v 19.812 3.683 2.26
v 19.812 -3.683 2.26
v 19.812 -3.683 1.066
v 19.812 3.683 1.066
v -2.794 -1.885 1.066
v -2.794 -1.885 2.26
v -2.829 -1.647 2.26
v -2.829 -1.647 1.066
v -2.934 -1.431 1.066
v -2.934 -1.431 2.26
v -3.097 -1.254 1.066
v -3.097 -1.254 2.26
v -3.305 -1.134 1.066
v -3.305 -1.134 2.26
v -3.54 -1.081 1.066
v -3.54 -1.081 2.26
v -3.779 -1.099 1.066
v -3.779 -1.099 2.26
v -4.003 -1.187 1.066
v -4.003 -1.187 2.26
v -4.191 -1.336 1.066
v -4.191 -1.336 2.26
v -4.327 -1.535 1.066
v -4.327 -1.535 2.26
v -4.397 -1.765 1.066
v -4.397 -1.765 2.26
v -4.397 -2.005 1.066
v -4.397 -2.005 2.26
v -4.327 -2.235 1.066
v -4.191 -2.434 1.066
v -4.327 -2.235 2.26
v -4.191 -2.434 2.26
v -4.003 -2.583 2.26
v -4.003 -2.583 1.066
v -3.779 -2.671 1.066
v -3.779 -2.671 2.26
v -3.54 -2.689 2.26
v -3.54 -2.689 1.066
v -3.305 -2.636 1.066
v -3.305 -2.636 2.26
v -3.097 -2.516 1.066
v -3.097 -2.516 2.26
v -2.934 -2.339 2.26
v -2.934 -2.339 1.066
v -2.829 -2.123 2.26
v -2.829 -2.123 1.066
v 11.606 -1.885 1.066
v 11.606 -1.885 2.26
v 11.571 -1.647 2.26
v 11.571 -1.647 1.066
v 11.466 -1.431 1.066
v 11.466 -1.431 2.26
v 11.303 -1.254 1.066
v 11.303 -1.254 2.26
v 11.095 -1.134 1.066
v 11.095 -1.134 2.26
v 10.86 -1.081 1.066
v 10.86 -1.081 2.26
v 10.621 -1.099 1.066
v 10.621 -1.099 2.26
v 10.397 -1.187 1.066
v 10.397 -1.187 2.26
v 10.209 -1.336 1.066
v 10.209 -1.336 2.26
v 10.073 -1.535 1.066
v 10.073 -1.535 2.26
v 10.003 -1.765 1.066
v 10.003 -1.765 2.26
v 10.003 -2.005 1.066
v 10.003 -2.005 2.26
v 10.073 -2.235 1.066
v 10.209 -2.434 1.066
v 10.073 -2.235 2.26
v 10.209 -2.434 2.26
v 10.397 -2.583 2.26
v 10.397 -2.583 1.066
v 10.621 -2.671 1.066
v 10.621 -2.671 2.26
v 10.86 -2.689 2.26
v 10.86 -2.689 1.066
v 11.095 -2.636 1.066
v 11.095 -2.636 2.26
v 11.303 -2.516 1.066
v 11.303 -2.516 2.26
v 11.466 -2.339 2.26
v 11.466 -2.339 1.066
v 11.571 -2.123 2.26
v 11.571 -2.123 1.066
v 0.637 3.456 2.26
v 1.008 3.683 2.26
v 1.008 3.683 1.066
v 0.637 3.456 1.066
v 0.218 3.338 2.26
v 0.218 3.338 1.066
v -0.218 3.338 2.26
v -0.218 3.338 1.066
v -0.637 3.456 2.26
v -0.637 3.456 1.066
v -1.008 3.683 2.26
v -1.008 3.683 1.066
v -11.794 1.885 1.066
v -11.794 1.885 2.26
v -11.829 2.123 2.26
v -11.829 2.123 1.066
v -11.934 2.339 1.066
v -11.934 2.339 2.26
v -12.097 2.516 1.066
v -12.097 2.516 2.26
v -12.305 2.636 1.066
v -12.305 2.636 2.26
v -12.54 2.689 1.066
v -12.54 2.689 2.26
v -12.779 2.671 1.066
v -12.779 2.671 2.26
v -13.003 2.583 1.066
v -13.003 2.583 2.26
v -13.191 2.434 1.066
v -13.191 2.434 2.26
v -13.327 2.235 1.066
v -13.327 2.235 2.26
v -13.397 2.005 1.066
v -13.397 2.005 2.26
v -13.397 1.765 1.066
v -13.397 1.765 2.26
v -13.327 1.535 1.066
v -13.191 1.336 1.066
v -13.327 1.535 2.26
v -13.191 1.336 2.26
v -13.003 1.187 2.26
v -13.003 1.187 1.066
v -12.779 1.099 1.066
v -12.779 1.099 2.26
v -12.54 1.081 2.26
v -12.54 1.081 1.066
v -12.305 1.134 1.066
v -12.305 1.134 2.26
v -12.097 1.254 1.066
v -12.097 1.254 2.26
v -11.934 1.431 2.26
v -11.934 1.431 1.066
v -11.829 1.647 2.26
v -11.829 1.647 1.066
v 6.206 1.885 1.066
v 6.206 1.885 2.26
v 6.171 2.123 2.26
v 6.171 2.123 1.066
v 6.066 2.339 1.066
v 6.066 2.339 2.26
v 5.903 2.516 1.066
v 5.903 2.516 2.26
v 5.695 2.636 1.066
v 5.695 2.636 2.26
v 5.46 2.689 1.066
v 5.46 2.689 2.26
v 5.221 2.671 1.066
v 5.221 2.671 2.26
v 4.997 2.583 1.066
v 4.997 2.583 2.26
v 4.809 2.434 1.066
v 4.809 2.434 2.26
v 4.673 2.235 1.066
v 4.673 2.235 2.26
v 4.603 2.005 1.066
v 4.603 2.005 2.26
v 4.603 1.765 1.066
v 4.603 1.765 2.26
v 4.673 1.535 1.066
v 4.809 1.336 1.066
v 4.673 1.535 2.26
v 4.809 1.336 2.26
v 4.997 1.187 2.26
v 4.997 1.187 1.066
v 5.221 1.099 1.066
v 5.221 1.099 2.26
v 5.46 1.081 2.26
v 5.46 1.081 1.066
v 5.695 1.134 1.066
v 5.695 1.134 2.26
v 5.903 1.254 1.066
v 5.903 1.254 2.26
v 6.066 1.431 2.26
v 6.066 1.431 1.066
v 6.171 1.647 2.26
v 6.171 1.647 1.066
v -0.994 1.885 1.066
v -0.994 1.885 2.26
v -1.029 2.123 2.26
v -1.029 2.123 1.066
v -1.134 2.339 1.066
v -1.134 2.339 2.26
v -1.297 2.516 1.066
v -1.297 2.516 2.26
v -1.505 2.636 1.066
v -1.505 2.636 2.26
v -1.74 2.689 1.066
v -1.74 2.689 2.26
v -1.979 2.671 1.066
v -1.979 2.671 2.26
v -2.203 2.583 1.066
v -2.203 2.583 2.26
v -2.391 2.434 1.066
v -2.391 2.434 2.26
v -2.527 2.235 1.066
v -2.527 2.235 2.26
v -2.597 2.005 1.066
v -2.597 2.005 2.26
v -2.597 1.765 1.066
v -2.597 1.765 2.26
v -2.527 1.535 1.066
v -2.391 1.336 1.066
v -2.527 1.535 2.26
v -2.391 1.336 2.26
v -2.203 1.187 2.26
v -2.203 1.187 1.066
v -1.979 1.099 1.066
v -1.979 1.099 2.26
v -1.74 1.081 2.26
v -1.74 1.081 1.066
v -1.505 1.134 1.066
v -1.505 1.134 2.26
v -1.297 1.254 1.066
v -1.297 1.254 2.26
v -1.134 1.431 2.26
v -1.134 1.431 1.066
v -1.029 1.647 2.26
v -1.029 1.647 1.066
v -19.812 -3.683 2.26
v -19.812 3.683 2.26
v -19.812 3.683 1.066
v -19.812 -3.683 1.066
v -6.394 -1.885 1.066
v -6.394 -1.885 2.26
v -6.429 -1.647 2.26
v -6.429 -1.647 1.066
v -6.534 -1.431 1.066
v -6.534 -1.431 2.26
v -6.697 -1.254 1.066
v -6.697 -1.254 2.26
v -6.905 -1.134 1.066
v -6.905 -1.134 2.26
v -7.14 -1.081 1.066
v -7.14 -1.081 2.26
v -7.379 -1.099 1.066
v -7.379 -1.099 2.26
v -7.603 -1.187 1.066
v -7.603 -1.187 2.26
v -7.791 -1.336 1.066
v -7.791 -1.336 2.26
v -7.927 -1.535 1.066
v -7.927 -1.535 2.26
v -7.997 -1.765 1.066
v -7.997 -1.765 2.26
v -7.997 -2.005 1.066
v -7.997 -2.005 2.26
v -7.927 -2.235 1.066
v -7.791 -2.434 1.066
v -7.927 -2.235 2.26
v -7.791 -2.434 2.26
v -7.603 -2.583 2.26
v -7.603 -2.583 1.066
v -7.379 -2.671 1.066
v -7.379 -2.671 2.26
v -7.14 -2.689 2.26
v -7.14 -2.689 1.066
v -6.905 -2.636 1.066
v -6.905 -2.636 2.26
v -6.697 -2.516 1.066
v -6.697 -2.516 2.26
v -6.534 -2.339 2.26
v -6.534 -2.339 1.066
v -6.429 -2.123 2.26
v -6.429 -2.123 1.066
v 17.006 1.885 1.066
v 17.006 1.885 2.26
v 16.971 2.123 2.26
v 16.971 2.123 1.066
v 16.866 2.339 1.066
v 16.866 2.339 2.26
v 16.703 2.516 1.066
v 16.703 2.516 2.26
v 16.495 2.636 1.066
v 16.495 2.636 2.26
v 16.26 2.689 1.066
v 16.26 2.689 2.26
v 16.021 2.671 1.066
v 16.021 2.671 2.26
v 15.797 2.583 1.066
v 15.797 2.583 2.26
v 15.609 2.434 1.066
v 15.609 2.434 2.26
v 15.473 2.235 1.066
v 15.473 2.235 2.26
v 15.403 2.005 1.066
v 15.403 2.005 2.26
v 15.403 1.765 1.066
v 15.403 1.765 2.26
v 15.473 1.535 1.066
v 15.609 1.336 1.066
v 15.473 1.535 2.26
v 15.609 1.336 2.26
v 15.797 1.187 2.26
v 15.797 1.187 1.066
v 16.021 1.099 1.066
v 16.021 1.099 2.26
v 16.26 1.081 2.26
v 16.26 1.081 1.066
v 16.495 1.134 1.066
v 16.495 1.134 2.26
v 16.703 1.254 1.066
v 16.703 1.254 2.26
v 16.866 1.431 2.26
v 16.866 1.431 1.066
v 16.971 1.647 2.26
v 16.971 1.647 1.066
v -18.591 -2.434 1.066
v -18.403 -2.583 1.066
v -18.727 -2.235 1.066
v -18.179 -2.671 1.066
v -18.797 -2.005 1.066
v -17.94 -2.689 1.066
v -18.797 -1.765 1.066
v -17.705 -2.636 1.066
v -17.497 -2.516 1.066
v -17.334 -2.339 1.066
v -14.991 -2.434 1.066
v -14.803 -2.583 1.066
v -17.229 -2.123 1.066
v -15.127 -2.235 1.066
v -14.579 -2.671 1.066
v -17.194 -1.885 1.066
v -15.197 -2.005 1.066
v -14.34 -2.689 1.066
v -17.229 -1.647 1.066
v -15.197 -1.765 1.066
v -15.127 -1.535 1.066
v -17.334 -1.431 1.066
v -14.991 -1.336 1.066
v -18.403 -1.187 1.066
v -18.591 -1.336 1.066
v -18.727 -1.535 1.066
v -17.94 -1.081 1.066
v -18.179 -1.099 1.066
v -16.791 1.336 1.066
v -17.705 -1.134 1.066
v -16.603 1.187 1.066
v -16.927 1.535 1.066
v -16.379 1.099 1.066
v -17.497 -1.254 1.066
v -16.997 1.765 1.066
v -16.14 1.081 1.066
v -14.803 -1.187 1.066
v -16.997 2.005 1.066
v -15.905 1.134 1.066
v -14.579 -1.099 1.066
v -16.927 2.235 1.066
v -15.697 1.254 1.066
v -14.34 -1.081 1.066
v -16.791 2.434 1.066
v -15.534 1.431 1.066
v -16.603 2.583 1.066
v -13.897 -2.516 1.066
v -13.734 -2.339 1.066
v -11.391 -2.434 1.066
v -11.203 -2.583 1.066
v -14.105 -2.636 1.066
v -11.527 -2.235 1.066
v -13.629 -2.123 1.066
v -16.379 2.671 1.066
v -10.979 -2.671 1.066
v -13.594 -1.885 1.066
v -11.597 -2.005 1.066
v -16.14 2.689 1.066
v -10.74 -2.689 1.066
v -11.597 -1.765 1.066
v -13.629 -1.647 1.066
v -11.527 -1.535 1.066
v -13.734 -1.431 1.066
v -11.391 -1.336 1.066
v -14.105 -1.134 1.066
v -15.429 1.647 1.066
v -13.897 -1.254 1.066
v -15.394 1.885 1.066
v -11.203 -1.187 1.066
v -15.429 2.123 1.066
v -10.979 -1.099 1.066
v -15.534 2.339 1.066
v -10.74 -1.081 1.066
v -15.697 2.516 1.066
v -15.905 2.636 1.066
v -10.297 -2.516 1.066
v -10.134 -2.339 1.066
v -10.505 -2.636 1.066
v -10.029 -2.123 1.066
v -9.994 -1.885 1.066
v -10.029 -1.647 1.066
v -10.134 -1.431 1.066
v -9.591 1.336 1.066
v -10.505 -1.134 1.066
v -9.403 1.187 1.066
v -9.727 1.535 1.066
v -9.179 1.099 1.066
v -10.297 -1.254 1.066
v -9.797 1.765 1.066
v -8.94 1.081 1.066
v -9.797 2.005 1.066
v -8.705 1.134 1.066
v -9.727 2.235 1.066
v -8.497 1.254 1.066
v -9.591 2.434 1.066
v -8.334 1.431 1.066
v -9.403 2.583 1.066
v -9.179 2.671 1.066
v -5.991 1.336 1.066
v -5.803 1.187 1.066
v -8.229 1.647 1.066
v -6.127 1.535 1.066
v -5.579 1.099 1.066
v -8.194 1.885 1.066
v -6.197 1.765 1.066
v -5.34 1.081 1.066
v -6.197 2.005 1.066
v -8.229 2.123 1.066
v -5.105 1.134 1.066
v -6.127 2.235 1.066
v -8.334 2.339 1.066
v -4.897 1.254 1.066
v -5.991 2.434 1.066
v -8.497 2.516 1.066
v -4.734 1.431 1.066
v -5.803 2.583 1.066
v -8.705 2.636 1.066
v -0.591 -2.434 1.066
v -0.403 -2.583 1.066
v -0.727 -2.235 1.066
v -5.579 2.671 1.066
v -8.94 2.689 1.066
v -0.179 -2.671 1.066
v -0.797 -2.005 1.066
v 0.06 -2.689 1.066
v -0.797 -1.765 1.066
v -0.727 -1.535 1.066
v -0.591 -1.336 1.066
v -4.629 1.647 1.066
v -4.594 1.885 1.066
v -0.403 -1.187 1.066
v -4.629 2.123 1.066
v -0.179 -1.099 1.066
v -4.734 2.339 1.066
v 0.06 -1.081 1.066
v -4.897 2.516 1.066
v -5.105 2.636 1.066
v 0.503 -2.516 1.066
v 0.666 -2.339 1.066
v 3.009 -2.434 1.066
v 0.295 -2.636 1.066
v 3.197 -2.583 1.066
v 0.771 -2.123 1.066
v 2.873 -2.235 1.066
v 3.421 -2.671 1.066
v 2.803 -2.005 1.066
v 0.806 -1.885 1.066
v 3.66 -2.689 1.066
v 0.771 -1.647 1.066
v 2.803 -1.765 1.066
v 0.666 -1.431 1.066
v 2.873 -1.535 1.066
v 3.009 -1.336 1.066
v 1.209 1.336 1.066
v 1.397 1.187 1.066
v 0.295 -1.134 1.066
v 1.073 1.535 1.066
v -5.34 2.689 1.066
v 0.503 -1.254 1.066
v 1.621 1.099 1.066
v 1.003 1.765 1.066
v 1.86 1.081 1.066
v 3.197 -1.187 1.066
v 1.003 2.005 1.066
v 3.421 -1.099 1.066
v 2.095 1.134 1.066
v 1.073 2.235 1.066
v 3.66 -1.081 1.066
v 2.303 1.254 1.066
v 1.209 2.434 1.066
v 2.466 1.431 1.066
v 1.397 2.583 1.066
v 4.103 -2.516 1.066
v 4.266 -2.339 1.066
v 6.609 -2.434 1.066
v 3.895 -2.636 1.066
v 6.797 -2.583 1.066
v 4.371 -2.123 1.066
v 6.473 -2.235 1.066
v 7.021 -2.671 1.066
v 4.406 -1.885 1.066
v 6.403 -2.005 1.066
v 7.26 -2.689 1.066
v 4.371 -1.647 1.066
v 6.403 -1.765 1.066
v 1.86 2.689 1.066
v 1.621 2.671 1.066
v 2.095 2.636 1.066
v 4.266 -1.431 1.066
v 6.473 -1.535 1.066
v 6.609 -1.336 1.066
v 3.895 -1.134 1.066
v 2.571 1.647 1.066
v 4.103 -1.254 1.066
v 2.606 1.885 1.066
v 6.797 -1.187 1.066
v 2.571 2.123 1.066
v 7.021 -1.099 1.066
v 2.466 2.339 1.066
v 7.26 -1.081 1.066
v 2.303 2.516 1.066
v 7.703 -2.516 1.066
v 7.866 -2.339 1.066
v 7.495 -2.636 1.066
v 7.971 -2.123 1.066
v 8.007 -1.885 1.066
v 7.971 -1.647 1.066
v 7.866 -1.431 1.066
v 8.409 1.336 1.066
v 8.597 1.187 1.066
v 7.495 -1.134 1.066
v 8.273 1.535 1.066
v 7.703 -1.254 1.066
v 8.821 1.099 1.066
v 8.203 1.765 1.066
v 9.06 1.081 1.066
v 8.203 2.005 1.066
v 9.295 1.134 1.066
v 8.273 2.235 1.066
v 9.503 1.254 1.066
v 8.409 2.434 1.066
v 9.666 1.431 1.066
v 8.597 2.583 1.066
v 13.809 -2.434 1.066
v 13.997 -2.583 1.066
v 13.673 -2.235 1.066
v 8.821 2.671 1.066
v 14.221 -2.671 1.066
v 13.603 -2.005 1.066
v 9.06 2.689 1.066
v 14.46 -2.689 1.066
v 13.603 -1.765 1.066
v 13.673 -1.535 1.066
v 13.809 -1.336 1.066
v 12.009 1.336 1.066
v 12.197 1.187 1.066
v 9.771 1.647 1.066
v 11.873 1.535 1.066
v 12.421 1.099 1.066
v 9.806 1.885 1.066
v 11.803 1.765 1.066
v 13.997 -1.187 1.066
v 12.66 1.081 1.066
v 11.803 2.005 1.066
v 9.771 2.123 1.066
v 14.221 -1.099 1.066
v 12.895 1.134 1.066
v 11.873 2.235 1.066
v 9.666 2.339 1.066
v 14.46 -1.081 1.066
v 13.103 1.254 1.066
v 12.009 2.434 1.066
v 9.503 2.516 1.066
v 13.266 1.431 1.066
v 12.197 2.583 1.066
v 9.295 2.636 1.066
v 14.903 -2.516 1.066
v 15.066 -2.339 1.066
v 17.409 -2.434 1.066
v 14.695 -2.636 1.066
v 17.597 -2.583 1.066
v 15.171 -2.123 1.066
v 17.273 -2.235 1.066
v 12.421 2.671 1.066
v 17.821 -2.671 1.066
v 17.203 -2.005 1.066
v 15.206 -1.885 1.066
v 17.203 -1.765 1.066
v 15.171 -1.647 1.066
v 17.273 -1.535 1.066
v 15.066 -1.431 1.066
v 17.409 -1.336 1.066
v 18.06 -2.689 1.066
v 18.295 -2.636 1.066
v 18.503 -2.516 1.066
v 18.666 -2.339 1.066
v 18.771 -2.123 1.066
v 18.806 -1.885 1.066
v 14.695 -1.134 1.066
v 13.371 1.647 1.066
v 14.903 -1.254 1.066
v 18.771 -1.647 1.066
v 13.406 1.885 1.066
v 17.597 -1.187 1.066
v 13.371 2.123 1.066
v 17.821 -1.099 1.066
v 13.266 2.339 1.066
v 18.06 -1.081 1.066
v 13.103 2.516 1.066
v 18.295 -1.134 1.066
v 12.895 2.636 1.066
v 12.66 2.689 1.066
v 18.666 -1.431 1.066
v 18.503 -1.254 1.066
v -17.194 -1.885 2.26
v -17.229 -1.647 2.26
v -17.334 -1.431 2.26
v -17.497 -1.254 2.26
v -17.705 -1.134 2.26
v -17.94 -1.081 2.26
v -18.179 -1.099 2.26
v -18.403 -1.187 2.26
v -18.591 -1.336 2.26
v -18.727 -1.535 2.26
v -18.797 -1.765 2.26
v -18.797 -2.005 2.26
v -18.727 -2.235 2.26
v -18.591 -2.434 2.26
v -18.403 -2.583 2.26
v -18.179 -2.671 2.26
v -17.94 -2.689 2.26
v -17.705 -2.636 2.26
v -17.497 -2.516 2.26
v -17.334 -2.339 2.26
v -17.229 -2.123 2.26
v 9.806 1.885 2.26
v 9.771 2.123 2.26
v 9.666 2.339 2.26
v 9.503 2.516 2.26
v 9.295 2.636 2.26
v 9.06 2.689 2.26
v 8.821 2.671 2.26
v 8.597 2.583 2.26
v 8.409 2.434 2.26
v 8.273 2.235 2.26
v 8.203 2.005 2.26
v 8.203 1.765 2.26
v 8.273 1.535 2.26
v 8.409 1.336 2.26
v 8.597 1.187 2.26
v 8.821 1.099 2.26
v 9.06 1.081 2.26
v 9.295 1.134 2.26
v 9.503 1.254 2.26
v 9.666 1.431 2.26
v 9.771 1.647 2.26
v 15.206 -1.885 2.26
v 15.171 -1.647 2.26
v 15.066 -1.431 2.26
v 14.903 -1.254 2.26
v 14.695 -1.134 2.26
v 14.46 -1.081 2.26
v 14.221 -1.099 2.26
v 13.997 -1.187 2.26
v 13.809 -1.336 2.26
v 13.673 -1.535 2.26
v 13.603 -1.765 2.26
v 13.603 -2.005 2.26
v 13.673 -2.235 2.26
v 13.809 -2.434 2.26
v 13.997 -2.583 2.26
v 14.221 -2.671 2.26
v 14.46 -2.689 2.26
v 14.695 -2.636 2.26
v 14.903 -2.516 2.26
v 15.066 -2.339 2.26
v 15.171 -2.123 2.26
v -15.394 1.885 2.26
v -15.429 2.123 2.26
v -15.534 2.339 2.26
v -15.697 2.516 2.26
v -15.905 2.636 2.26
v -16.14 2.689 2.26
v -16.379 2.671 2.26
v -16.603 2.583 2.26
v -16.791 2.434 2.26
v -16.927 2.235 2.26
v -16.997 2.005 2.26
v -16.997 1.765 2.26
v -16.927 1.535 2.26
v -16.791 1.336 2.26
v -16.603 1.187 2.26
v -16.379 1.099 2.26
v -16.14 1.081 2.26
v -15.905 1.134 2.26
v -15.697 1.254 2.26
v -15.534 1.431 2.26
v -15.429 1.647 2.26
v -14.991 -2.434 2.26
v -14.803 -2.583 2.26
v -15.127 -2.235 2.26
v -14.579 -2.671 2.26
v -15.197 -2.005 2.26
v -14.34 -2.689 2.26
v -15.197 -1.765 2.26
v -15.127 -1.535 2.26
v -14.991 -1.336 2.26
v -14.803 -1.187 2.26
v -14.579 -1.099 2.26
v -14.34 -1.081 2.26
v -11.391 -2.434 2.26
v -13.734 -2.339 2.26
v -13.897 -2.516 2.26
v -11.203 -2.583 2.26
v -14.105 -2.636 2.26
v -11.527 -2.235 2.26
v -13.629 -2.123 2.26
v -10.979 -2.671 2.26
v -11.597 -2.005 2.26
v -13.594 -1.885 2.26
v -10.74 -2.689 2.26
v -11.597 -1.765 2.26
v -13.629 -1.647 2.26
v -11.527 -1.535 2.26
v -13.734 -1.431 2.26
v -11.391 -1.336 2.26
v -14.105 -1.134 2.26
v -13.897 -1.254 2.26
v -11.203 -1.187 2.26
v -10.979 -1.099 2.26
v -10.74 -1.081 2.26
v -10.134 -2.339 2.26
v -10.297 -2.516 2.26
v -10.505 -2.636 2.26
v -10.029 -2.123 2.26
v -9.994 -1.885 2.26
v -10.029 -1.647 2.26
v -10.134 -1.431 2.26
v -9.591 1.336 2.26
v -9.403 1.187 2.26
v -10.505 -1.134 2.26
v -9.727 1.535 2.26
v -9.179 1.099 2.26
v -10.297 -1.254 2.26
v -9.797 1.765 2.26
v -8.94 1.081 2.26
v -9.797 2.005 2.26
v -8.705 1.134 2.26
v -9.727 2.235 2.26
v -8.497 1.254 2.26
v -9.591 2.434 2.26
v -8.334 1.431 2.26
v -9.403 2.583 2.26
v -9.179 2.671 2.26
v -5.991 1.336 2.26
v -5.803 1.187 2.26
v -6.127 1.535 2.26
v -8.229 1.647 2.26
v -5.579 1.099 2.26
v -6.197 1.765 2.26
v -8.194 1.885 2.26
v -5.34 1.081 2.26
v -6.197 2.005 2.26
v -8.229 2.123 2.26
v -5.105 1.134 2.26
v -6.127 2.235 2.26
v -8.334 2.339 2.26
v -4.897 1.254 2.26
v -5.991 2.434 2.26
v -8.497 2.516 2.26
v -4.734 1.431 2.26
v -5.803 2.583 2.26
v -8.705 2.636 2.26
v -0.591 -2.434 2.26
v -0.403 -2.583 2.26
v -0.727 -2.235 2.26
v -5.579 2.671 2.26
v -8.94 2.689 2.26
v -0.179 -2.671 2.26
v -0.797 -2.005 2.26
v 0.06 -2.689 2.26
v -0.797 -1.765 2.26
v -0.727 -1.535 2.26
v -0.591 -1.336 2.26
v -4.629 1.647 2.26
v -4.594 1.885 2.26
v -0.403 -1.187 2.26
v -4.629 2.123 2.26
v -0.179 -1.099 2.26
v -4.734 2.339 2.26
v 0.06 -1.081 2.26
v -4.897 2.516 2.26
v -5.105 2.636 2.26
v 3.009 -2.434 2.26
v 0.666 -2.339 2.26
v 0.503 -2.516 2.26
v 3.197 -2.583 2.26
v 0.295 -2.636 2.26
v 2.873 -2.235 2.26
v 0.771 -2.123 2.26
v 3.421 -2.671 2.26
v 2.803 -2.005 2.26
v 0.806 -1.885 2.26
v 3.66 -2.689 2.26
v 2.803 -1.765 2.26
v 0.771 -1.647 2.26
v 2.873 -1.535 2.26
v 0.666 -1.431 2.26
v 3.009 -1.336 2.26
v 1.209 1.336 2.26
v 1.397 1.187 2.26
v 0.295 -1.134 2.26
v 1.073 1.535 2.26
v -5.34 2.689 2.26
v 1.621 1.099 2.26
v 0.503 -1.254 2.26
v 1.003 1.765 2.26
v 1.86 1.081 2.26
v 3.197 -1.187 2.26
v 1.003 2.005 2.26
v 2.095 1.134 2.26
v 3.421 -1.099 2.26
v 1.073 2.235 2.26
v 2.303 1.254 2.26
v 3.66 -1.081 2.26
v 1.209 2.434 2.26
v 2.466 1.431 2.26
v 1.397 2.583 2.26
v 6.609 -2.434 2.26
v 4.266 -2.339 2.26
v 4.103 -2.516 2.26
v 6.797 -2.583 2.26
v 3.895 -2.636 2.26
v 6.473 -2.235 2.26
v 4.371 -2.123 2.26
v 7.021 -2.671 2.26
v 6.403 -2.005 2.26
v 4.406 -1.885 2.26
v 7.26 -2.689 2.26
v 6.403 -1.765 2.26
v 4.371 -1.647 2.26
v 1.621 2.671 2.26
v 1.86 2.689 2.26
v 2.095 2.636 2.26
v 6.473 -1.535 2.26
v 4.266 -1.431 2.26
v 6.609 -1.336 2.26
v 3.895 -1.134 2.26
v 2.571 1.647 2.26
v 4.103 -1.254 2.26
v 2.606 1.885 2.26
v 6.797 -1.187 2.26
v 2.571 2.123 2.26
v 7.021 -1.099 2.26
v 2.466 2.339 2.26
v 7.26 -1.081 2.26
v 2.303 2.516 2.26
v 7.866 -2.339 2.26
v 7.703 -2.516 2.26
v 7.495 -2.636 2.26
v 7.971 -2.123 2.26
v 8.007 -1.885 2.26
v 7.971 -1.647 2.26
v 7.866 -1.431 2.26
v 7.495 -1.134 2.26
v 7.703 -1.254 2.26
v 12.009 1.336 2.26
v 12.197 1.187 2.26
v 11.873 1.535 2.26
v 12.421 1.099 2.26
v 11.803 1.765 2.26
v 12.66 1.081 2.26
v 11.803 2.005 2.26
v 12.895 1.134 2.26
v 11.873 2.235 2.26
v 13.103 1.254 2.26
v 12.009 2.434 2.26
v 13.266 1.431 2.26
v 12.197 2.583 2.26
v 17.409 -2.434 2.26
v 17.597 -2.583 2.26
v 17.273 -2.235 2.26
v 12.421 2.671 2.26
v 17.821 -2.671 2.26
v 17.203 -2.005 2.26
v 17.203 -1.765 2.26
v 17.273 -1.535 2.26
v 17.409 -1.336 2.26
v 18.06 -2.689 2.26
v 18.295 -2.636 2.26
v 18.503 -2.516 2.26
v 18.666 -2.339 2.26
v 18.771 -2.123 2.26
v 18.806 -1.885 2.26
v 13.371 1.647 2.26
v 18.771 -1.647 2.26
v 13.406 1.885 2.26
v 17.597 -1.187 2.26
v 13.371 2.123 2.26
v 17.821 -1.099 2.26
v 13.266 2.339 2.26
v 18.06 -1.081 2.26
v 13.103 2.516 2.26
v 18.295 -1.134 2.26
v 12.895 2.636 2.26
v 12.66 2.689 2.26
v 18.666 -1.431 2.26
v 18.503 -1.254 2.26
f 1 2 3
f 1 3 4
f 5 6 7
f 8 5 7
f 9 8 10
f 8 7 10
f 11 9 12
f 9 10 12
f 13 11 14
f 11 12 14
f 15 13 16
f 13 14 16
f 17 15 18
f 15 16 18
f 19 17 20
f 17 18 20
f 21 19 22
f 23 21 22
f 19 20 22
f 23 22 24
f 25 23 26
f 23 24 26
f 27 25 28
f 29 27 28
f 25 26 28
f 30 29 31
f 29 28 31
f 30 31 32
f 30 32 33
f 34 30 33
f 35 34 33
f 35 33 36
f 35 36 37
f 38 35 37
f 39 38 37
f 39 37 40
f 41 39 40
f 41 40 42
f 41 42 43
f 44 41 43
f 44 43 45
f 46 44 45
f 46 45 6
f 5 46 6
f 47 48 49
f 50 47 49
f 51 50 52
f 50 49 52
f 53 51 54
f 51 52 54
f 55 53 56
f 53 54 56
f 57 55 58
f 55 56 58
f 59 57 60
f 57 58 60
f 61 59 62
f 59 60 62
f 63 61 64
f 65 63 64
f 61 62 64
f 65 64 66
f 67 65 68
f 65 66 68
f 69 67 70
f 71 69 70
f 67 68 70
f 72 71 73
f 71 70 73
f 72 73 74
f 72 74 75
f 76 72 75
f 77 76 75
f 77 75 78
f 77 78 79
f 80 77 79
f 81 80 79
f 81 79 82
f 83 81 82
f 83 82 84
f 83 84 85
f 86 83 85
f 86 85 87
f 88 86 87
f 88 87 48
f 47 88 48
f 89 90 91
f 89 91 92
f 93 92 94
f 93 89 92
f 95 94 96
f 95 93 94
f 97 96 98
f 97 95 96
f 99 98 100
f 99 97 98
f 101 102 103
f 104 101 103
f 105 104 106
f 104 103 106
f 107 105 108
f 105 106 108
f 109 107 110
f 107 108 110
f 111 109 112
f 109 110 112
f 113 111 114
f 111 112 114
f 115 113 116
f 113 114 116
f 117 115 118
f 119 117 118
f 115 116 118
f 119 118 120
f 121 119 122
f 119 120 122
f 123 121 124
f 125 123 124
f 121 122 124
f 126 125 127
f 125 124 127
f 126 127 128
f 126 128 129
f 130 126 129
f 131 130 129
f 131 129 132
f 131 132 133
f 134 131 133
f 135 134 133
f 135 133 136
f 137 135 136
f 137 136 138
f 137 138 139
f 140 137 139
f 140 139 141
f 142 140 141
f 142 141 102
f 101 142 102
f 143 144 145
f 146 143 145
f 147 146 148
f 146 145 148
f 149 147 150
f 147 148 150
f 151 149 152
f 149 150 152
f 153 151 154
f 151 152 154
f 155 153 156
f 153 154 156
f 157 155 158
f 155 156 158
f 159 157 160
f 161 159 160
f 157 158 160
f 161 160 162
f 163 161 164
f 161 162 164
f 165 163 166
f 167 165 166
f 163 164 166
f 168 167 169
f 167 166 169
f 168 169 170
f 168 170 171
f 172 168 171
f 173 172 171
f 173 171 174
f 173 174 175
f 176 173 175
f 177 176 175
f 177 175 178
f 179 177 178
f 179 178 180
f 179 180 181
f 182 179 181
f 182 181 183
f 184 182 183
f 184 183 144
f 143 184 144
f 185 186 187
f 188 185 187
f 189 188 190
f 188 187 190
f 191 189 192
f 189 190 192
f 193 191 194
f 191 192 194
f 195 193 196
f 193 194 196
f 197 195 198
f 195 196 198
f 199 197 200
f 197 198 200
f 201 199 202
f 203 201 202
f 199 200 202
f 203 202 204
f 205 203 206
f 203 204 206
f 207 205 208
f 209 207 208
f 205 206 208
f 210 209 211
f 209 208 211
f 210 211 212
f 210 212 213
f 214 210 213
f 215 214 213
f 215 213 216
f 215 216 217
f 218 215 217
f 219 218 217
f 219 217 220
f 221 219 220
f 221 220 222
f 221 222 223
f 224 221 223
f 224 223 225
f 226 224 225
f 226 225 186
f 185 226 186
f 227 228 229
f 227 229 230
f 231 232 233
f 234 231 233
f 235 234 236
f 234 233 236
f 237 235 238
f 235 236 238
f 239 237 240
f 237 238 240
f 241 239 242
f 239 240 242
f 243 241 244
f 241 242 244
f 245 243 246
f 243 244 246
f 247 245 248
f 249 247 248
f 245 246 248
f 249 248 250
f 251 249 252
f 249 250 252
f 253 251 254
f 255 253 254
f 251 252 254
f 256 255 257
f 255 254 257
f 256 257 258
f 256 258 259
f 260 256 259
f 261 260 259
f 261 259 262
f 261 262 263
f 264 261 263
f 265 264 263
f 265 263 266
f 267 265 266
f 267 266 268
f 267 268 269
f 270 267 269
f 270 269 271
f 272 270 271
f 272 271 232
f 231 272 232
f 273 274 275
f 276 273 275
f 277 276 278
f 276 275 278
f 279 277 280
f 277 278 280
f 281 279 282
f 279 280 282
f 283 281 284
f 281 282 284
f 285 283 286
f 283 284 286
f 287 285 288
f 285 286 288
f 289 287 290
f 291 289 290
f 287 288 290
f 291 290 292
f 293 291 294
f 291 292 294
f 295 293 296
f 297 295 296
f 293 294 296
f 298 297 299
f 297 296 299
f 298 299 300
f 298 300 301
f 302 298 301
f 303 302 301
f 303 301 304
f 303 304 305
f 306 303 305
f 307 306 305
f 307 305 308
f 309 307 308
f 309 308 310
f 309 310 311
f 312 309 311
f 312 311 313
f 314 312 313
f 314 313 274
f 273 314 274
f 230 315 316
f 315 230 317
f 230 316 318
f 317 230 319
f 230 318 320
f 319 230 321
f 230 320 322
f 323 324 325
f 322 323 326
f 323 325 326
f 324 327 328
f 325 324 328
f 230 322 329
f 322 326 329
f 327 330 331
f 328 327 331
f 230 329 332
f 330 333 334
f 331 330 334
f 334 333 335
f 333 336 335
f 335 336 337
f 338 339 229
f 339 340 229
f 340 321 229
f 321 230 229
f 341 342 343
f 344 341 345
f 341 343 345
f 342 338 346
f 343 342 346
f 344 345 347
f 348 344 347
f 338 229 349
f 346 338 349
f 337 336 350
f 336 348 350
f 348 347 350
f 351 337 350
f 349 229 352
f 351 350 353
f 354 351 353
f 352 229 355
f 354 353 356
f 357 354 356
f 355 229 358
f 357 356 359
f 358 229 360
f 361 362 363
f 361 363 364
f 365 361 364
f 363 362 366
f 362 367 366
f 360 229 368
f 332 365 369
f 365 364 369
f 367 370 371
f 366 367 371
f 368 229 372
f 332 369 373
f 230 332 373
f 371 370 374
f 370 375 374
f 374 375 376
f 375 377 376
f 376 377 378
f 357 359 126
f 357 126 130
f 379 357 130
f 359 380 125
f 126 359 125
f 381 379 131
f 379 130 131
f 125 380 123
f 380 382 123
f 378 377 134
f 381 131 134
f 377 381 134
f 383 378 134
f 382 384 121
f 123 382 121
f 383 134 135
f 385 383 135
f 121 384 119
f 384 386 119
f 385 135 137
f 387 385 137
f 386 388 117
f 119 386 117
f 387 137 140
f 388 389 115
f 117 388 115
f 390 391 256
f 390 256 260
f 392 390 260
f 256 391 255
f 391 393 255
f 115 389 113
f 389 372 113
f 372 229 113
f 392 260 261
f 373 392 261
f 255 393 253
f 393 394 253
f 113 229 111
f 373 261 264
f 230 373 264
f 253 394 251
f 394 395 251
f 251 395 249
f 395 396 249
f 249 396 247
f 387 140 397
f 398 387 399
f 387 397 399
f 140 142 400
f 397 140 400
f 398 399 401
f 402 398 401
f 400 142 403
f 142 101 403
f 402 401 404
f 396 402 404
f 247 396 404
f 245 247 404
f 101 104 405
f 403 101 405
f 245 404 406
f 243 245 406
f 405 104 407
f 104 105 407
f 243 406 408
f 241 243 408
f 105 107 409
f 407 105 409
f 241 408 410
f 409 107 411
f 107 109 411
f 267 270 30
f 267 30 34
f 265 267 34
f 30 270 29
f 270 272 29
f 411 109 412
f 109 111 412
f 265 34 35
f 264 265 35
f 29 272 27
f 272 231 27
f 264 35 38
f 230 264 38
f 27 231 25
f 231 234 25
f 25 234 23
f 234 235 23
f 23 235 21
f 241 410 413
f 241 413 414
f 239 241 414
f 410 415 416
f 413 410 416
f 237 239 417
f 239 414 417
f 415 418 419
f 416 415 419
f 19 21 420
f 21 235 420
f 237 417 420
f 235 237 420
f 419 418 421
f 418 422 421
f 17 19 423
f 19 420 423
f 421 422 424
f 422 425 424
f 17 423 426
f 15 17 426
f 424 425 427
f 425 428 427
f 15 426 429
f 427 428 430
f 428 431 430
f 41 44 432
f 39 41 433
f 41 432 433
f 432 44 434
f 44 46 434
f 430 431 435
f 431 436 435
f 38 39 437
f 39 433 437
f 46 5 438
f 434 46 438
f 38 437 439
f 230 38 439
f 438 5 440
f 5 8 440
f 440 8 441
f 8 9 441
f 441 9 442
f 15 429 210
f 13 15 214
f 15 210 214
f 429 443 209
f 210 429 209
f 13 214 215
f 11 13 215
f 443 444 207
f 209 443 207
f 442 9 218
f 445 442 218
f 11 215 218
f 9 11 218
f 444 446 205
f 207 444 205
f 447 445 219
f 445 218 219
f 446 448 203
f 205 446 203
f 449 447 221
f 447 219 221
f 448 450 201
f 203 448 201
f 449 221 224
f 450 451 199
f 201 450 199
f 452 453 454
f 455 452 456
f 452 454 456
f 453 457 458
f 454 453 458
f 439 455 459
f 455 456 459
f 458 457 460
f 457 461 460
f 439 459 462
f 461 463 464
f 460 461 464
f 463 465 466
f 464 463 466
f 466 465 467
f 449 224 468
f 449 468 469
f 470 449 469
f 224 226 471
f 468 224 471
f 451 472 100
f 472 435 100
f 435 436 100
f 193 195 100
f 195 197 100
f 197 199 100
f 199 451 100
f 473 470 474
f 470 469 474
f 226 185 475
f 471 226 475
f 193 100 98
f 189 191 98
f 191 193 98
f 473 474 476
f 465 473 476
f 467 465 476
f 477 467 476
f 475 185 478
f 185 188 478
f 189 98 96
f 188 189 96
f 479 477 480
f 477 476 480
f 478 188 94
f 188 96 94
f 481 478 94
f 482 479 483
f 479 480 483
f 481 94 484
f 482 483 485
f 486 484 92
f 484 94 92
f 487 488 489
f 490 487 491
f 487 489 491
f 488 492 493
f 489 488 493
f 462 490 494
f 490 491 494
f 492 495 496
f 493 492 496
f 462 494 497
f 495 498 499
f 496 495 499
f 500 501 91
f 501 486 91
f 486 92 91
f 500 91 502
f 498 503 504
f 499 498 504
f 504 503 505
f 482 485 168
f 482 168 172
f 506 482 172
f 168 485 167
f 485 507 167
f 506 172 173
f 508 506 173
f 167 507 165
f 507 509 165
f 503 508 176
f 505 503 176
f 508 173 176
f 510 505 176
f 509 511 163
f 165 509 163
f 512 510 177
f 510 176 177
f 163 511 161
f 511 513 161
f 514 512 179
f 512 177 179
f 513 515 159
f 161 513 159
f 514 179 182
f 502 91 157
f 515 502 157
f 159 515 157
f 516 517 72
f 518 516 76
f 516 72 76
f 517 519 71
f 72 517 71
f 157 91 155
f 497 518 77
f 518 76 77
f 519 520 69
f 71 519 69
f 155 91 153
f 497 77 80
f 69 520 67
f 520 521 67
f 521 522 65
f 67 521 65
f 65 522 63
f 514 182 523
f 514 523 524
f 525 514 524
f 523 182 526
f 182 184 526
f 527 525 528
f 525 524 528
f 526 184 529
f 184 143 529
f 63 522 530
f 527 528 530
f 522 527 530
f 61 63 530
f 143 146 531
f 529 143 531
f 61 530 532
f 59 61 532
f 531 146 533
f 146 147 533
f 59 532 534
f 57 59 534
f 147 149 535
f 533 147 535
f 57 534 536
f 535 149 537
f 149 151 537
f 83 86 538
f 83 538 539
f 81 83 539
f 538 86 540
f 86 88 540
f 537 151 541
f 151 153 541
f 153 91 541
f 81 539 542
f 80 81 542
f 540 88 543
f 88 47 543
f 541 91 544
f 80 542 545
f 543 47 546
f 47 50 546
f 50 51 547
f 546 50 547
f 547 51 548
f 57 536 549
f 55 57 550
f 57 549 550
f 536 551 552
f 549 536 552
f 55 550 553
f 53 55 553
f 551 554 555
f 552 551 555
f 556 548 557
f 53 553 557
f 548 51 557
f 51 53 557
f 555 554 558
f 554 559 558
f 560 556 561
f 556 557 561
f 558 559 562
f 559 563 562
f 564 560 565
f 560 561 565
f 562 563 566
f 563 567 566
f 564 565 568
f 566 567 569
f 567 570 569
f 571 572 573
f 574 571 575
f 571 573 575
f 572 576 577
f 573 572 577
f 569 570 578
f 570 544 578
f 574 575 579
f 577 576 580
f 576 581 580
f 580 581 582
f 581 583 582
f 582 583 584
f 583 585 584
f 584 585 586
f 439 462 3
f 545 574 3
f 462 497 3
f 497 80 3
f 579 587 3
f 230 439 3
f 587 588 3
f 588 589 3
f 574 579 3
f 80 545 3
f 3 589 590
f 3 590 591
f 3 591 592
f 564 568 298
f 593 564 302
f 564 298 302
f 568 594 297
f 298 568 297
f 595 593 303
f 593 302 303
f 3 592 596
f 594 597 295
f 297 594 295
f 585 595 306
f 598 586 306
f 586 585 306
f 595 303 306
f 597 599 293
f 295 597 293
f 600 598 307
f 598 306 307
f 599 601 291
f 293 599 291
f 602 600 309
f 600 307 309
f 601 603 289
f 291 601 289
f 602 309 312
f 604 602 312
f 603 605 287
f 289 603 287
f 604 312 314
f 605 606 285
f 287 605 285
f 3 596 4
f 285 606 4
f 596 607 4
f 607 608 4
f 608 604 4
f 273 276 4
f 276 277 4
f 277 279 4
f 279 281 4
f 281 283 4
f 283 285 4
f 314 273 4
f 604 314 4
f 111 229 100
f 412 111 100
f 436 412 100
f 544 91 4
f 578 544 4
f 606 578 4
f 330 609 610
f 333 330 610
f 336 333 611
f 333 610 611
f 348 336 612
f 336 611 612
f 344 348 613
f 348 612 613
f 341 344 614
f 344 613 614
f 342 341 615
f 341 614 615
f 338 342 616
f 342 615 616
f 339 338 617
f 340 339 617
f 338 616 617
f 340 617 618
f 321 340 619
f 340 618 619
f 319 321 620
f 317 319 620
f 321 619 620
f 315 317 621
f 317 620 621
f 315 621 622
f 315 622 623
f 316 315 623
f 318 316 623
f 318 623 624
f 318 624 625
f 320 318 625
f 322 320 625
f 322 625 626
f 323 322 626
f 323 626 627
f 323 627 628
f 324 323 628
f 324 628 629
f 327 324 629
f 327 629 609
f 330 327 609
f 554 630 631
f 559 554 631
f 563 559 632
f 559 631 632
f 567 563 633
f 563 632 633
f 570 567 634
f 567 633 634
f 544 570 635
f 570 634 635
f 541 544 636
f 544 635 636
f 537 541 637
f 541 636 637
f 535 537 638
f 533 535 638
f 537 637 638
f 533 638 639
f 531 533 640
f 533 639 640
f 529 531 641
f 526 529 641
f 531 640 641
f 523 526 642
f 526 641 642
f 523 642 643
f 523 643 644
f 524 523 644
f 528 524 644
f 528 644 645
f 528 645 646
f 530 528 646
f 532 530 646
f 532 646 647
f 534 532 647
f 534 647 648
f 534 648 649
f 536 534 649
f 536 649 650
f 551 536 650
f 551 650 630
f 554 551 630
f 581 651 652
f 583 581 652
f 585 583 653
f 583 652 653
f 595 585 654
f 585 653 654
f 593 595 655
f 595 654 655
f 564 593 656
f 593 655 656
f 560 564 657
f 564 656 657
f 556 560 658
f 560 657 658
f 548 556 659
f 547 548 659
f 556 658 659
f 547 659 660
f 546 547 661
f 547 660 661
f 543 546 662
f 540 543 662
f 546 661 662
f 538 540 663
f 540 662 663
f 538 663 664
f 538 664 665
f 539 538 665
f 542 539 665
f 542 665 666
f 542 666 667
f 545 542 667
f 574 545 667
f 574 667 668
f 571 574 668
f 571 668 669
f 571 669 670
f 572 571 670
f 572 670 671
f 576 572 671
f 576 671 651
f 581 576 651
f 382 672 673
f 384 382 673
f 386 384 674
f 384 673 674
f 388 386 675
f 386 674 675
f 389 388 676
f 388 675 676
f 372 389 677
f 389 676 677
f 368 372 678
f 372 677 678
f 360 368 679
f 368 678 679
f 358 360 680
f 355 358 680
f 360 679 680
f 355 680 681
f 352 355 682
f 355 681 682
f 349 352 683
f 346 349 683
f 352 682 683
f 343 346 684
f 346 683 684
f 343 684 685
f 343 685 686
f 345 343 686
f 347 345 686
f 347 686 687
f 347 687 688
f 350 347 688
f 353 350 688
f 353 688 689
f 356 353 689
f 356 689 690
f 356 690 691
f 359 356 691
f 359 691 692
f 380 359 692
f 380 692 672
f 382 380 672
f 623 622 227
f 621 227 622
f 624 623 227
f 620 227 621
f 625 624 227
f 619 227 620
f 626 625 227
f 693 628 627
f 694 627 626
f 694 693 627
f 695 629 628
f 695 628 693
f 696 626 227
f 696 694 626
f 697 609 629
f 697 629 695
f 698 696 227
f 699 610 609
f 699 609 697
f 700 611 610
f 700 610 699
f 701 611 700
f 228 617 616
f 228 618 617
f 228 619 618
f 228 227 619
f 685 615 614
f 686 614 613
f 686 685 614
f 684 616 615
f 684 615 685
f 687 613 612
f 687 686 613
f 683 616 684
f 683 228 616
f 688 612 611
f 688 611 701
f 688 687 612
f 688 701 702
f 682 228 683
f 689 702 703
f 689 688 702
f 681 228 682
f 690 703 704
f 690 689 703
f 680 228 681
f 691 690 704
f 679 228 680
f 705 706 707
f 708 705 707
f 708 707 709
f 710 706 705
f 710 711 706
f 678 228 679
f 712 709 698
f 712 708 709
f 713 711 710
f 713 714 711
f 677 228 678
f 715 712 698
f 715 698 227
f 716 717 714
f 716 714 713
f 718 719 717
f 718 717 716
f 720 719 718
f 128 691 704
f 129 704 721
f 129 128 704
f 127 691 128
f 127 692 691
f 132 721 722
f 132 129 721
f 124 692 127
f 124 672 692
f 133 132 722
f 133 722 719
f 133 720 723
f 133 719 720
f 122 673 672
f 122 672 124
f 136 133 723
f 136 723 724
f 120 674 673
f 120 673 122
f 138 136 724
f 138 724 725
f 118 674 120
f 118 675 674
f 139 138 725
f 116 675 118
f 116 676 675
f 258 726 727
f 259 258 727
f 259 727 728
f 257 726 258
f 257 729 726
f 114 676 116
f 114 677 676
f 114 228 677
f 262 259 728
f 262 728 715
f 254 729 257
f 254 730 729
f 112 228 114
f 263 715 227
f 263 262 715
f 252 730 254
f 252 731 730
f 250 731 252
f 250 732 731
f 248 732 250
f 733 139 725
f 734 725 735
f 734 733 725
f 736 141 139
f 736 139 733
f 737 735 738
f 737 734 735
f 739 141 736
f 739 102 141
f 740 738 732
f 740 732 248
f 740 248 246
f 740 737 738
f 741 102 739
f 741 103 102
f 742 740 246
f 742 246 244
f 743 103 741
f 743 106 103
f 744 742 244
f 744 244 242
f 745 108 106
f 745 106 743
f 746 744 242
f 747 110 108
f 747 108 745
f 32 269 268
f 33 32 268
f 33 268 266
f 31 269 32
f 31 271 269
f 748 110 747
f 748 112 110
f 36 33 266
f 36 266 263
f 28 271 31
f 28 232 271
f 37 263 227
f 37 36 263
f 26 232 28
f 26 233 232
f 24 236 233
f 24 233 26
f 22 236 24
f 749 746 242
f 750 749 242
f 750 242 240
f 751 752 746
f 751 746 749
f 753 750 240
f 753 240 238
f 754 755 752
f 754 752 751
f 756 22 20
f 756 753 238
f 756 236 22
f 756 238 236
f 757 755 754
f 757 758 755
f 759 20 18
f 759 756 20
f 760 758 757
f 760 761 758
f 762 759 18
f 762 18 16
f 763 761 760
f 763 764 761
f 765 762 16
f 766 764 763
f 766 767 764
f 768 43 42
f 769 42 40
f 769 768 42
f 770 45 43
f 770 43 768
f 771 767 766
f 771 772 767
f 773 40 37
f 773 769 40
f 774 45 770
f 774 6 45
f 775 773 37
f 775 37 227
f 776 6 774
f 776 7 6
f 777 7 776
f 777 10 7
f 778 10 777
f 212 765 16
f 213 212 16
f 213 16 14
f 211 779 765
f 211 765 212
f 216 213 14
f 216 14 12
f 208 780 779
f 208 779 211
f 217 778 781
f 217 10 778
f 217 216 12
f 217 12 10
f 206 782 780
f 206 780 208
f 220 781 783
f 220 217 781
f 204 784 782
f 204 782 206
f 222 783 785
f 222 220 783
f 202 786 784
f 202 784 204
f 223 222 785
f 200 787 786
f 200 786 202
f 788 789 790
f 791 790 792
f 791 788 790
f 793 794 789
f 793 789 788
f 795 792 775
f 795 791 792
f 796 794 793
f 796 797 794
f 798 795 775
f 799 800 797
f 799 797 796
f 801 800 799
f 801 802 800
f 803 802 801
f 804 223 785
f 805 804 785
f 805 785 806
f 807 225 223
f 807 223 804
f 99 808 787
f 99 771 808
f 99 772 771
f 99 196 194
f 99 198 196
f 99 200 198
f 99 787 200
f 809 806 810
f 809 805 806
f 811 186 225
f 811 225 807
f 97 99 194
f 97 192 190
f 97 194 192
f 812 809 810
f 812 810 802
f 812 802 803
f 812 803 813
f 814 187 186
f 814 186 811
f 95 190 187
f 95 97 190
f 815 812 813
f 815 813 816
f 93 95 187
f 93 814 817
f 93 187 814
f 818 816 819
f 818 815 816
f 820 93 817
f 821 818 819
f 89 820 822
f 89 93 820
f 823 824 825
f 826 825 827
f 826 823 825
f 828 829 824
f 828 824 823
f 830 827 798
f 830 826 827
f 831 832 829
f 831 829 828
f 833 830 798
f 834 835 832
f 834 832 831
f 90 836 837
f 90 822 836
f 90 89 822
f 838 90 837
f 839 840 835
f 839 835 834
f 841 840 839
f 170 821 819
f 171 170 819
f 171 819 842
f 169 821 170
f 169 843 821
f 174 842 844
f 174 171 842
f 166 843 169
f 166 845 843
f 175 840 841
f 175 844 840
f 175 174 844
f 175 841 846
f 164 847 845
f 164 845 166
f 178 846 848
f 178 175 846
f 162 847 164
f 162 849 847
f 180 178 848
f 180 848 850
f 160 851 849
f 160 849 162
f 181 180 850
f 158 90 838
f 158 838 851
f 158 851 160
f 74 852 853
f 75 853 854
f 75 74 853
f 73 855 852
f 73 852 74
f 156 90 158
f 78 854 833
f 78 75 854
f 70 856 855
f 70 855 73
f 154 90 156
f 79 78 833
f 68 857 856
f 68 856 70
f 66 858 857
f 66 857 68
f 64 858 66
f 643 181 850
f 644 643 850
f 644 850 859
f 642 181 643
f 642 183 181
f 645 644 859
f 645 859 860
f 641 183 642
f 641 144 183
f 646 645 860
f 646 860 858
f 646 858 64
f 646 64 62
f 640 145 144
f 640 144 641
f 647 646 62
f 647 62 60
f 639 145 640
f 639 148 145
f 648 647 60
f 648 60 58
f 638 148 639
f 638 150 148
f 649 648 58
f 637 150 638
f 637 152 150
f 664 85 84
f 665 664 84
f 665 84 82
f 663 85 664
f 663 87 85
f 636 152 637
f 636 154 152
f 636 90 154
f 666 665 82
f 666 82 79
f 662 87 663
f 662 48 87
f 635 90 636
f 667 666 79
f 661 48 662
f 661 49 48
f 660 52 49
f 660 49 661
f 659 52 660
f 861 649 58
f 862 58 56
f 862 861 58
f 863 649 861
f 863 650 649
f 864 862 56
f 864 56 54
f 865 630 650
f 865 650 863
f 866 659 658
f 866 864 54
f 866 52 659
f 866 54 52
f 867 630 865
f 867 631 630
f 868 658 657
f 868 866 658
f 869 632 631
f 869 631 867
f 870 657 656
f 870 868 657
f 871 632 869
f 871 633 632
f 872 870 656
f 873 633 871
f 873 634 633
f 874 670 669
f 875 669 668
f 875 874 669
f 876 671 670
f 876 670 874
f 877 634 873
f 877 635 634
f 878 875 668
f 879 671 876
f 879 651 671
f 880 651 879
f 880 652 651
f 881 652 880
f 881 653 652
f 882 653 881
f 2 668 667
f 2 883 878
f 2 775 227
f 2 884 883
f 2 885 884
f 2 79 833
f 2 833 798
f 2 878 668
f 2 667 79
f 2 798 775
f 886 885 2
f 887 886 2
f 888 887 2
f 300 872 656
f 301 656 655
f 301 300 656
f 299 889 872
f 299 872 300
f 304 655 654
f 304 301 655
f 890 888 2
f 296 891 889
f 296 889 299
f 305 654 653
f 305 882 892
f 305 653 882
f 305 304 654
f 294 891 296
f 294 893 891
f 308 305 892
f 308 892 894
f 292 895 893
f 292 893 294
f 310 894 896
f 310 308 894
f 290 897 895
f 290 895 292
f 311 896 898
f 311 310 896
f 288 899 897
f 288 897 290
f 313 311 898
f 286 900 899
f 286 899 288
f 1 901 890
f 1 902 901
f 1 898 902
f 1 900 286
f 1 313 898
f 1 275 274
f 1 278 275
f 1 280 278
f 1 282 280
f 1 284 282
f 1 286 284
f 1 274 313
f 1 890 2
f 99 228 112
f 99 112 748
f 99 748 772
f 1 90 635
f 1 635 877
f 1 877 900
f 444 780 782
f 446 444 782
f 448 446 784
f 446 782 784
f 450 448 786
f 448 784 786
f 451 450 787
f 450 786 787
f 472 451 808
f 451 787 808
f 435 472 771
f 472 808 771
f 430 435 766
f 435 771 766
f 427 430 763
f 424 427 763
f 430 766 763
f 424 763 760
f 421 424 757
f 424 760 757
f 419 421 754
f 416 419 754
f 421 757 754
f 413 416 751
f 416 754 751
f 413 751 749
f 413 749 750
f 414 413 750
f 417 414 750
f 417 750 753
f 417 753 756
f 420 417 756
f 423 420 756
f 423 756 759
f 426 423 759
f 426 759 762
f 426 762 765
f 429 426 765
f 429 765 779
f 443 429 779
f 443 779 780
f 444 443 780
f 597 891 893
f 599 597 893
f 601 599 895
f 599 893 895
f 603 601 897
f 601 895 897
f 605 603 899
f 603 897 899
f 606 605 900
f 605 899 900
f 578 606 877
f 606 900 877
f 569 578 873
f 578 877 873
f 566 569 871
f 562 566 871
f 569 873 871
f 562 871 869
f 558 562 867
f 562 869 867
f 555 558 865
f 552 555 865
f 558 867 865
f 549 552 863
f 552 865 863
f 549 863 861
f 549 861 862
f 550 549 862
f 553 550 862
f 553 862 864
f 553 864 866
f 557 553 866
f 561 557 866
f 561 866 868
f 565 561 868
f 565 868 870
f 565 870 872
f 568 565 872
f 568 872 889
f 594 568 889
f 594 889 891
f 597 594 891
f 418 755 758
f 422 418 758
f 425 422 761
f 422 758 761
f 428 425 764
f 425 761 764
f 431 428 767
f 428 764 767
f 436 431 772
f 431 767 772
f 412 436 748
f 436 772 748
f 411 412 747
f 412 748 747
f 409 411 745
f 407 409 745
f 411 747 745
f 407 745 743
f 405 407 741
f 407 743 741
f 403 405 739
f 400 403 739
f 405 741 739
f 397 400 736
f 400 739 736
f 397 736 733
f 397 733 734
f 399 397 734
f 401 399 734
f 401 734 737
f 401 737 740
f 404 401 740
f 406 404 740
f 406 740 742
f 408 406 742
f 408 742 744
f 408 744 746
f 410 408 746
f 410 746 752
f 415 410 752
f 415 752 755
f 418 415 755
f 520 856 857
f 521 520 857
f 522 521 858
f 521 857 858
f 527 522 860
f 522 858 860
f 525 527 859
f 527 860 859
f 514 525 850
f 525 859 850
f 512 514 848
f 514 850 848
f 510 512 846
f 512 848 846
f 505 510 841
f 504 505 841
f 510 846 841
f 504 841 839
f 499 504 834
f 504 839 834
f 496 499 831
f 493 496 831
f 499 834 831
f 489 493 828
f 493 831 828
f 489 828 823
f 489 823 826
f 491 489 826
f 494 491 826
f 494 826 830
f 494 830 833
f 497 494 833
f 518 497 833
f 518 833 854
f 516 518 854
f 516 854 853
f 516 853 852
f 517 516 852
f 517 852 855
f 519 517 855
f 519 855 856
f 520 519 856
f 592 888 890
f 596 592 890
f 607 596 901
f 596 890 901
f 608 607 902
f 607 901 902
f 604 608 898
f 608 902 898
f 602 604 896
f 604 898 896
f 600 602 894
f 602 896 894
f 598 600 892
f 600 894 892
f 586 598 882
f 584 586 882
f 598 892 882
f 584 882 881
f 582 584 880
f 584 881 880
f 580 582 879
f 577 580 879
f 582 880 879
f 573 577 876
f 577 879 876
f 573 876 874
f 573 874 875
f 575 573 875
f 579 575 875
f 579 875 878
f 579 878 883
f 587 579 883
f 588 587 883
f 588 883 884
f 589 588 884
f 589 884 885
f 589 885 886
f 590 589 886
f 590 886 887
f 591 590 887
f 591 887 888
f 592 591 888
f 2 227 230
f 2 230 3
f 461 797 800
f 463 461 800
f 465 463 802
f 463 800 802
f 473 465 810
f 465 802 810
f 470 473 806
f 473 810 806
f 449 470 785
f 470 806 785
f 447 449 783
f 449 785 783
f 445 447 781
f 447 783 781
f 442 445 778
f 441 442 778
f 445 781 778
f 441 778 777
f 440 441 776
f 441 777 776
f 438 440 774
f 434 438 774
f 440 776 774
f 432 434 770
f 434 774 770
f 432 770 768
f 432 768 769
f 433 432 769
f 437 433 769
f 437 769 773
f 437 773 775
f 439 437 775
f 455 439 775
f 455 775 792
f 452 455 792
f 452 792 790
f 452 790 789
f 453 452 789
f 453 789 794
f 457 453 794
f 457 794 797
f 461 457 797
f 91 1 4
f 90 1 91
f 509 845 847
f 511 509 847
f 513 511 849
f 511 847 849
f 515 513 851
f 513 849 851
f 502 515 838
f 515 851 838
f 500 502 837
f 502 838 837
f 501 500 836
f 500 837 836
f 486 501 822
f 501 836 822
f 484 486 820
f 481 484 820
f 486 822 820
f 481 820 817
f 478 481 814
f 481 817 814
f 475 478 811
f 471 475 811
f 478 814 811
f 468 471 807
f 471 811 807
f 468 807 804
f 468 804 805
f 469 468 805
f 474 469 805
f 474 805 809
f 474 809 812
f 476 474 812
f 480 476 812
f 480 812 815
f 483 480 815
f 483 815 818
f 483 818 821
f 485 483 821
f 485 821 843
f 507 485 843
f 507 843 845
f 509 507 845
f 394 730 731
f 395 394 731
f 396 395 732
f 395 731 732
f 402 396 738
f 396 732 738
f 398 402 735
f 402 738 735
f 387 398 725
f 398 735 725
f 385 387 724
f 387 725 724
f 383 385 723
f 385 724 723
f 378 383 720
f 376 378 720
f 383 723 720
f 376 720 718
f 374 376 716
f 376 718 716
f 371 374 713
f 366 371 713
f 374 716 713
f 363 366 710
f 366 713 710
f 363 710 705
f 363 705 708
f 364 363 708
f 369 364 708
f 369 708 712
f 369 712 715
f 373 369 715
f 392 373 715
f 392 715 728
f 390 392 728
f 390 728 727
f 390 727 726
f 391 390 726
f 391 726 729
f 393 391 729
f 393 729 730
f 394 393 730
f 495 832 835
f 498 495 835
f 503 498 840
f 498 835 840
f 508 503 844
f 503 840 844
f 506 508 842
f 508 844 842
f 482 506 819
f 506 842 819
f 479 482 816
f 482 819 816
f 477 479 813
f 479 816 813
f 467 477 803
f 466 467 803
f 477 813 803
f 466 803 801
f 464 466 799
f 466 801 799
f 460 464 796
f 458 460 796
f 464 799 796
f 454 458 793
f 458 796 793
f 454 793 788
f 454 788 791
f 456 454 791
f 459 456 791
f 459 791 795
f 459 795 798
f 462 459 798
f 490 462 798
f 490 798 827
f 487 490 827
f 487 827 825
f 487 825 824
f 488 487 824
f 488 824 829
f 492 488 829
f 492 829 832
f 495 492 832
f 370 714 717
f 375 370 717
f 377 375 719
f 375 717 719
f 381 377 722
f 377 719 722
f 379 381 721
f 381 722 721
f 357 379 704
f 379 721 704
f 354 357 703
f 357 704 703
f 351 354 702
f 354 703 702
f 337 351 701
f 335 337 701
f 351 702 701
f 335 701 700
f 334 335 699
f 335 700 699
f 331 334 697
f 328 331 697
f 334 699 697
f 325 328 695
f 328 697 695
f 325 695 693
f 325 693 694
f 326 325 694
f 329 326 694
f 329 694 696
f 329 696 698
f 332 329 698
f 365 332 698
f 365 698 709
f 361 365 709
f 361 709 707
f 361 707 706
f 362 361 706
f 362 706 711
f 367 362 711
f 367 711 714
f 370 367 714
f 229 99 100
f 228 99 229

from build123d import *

# Parameters (mm, degrees)
BOSS_EXTRUDE1_DEPTH = 1.194
SKETCH2_R           = 0.8065
CUT_EXTRUDE1_DEPTH  = 2.194


with BuildPart() as part:
    # Sketch1 → Boss-Extrude1 (new body)
    with BuildSketch(Plane.XY.offset(2.26)):
        with BuildLine():
            Line((-1.008396957, 3.683), (-19.812, 3.683))
            Line((-19.812, 3.683), (-19.812, -3.683))
            Line((-19.812, -3.683), (19.812, -3.683))
            Line((19.812, -3.683), (19.812, 3.683))
            Line((19.812, 3.683), (1.008396957, 3.683))
            ThreePointArc((1.008396957, 3.683), (0, 3.322929517), (-1.008396957, 3.683))
        make_face()
    extrude(amount=-BOSS_EXTRUDE1_DEPTH)

    # Sketch2 → Cut-Extrude1 (cut, through all)
    with BuildSketch(Plane.XY.offset(2.26)):
        with Locations((-18, -1.885)):
            Circle(SKETCH2_R)
        with Locations((-16.2, 1.885)):
            Circle(SKETCH2_R)
        with Locations((-14.4, -1.885)):
            Circle(SKETCH2_R)
        with Locations((-10.8, -1.885)):
            Circle(SKETCH2_R)
        with Locations((-7.2, -1.885)):
            Circle(SKETCH2_R)
        with Locations((-3.6, -1.885)):
            Circle(SKETCH2_R)
        with Locations((0, -1.885)):
            Circle(SKETCH2_R)
        with Locations((3.6, -1.885)):
            Circle(SKETCH2_R)
        with Locations((7.2, -1.885)):
            Circle(SKETCH2_R)
        with Locations((10.8, -1.885)):
            Circle(SKETCH2_R)
        with Locations((14.4, -1.885)):
            Circle(SKETCH2_R)
        with Locations((18, -1.885)):
            Circle(SKETCH2_R)
        with Locations((-12.6, 1.885)):
            Circle(SKETCH2_R)
        with Locations((-9, 1.885)):
            Circle(SKETCH2_R)
        with Locations((-5.4, 1.885)):
            Circle(SKETCH2_R)
        with Locations((-1.8, 1.885)):
            Circle(SKETCH2_R)
        with Locations((1.8, 1.885)):
            Circle(SKETCH2_R)
        with Locations((5.4, 1.885)):
            Circle(SKETCH2_R)
        with Locations((9, 1.885)):
            Circle(SKETCH2_R)
        with Locations((12.6, 1.885)):
            Circle(SKETCH2_R)
        with Locations((16.2, 1.885)):
            Circle(SKETCH2_R)
    extrude(amount=-CUT_EXTRUDE1_DEPTH, mode=Mode.SUBTRACT)


solid = part.part
